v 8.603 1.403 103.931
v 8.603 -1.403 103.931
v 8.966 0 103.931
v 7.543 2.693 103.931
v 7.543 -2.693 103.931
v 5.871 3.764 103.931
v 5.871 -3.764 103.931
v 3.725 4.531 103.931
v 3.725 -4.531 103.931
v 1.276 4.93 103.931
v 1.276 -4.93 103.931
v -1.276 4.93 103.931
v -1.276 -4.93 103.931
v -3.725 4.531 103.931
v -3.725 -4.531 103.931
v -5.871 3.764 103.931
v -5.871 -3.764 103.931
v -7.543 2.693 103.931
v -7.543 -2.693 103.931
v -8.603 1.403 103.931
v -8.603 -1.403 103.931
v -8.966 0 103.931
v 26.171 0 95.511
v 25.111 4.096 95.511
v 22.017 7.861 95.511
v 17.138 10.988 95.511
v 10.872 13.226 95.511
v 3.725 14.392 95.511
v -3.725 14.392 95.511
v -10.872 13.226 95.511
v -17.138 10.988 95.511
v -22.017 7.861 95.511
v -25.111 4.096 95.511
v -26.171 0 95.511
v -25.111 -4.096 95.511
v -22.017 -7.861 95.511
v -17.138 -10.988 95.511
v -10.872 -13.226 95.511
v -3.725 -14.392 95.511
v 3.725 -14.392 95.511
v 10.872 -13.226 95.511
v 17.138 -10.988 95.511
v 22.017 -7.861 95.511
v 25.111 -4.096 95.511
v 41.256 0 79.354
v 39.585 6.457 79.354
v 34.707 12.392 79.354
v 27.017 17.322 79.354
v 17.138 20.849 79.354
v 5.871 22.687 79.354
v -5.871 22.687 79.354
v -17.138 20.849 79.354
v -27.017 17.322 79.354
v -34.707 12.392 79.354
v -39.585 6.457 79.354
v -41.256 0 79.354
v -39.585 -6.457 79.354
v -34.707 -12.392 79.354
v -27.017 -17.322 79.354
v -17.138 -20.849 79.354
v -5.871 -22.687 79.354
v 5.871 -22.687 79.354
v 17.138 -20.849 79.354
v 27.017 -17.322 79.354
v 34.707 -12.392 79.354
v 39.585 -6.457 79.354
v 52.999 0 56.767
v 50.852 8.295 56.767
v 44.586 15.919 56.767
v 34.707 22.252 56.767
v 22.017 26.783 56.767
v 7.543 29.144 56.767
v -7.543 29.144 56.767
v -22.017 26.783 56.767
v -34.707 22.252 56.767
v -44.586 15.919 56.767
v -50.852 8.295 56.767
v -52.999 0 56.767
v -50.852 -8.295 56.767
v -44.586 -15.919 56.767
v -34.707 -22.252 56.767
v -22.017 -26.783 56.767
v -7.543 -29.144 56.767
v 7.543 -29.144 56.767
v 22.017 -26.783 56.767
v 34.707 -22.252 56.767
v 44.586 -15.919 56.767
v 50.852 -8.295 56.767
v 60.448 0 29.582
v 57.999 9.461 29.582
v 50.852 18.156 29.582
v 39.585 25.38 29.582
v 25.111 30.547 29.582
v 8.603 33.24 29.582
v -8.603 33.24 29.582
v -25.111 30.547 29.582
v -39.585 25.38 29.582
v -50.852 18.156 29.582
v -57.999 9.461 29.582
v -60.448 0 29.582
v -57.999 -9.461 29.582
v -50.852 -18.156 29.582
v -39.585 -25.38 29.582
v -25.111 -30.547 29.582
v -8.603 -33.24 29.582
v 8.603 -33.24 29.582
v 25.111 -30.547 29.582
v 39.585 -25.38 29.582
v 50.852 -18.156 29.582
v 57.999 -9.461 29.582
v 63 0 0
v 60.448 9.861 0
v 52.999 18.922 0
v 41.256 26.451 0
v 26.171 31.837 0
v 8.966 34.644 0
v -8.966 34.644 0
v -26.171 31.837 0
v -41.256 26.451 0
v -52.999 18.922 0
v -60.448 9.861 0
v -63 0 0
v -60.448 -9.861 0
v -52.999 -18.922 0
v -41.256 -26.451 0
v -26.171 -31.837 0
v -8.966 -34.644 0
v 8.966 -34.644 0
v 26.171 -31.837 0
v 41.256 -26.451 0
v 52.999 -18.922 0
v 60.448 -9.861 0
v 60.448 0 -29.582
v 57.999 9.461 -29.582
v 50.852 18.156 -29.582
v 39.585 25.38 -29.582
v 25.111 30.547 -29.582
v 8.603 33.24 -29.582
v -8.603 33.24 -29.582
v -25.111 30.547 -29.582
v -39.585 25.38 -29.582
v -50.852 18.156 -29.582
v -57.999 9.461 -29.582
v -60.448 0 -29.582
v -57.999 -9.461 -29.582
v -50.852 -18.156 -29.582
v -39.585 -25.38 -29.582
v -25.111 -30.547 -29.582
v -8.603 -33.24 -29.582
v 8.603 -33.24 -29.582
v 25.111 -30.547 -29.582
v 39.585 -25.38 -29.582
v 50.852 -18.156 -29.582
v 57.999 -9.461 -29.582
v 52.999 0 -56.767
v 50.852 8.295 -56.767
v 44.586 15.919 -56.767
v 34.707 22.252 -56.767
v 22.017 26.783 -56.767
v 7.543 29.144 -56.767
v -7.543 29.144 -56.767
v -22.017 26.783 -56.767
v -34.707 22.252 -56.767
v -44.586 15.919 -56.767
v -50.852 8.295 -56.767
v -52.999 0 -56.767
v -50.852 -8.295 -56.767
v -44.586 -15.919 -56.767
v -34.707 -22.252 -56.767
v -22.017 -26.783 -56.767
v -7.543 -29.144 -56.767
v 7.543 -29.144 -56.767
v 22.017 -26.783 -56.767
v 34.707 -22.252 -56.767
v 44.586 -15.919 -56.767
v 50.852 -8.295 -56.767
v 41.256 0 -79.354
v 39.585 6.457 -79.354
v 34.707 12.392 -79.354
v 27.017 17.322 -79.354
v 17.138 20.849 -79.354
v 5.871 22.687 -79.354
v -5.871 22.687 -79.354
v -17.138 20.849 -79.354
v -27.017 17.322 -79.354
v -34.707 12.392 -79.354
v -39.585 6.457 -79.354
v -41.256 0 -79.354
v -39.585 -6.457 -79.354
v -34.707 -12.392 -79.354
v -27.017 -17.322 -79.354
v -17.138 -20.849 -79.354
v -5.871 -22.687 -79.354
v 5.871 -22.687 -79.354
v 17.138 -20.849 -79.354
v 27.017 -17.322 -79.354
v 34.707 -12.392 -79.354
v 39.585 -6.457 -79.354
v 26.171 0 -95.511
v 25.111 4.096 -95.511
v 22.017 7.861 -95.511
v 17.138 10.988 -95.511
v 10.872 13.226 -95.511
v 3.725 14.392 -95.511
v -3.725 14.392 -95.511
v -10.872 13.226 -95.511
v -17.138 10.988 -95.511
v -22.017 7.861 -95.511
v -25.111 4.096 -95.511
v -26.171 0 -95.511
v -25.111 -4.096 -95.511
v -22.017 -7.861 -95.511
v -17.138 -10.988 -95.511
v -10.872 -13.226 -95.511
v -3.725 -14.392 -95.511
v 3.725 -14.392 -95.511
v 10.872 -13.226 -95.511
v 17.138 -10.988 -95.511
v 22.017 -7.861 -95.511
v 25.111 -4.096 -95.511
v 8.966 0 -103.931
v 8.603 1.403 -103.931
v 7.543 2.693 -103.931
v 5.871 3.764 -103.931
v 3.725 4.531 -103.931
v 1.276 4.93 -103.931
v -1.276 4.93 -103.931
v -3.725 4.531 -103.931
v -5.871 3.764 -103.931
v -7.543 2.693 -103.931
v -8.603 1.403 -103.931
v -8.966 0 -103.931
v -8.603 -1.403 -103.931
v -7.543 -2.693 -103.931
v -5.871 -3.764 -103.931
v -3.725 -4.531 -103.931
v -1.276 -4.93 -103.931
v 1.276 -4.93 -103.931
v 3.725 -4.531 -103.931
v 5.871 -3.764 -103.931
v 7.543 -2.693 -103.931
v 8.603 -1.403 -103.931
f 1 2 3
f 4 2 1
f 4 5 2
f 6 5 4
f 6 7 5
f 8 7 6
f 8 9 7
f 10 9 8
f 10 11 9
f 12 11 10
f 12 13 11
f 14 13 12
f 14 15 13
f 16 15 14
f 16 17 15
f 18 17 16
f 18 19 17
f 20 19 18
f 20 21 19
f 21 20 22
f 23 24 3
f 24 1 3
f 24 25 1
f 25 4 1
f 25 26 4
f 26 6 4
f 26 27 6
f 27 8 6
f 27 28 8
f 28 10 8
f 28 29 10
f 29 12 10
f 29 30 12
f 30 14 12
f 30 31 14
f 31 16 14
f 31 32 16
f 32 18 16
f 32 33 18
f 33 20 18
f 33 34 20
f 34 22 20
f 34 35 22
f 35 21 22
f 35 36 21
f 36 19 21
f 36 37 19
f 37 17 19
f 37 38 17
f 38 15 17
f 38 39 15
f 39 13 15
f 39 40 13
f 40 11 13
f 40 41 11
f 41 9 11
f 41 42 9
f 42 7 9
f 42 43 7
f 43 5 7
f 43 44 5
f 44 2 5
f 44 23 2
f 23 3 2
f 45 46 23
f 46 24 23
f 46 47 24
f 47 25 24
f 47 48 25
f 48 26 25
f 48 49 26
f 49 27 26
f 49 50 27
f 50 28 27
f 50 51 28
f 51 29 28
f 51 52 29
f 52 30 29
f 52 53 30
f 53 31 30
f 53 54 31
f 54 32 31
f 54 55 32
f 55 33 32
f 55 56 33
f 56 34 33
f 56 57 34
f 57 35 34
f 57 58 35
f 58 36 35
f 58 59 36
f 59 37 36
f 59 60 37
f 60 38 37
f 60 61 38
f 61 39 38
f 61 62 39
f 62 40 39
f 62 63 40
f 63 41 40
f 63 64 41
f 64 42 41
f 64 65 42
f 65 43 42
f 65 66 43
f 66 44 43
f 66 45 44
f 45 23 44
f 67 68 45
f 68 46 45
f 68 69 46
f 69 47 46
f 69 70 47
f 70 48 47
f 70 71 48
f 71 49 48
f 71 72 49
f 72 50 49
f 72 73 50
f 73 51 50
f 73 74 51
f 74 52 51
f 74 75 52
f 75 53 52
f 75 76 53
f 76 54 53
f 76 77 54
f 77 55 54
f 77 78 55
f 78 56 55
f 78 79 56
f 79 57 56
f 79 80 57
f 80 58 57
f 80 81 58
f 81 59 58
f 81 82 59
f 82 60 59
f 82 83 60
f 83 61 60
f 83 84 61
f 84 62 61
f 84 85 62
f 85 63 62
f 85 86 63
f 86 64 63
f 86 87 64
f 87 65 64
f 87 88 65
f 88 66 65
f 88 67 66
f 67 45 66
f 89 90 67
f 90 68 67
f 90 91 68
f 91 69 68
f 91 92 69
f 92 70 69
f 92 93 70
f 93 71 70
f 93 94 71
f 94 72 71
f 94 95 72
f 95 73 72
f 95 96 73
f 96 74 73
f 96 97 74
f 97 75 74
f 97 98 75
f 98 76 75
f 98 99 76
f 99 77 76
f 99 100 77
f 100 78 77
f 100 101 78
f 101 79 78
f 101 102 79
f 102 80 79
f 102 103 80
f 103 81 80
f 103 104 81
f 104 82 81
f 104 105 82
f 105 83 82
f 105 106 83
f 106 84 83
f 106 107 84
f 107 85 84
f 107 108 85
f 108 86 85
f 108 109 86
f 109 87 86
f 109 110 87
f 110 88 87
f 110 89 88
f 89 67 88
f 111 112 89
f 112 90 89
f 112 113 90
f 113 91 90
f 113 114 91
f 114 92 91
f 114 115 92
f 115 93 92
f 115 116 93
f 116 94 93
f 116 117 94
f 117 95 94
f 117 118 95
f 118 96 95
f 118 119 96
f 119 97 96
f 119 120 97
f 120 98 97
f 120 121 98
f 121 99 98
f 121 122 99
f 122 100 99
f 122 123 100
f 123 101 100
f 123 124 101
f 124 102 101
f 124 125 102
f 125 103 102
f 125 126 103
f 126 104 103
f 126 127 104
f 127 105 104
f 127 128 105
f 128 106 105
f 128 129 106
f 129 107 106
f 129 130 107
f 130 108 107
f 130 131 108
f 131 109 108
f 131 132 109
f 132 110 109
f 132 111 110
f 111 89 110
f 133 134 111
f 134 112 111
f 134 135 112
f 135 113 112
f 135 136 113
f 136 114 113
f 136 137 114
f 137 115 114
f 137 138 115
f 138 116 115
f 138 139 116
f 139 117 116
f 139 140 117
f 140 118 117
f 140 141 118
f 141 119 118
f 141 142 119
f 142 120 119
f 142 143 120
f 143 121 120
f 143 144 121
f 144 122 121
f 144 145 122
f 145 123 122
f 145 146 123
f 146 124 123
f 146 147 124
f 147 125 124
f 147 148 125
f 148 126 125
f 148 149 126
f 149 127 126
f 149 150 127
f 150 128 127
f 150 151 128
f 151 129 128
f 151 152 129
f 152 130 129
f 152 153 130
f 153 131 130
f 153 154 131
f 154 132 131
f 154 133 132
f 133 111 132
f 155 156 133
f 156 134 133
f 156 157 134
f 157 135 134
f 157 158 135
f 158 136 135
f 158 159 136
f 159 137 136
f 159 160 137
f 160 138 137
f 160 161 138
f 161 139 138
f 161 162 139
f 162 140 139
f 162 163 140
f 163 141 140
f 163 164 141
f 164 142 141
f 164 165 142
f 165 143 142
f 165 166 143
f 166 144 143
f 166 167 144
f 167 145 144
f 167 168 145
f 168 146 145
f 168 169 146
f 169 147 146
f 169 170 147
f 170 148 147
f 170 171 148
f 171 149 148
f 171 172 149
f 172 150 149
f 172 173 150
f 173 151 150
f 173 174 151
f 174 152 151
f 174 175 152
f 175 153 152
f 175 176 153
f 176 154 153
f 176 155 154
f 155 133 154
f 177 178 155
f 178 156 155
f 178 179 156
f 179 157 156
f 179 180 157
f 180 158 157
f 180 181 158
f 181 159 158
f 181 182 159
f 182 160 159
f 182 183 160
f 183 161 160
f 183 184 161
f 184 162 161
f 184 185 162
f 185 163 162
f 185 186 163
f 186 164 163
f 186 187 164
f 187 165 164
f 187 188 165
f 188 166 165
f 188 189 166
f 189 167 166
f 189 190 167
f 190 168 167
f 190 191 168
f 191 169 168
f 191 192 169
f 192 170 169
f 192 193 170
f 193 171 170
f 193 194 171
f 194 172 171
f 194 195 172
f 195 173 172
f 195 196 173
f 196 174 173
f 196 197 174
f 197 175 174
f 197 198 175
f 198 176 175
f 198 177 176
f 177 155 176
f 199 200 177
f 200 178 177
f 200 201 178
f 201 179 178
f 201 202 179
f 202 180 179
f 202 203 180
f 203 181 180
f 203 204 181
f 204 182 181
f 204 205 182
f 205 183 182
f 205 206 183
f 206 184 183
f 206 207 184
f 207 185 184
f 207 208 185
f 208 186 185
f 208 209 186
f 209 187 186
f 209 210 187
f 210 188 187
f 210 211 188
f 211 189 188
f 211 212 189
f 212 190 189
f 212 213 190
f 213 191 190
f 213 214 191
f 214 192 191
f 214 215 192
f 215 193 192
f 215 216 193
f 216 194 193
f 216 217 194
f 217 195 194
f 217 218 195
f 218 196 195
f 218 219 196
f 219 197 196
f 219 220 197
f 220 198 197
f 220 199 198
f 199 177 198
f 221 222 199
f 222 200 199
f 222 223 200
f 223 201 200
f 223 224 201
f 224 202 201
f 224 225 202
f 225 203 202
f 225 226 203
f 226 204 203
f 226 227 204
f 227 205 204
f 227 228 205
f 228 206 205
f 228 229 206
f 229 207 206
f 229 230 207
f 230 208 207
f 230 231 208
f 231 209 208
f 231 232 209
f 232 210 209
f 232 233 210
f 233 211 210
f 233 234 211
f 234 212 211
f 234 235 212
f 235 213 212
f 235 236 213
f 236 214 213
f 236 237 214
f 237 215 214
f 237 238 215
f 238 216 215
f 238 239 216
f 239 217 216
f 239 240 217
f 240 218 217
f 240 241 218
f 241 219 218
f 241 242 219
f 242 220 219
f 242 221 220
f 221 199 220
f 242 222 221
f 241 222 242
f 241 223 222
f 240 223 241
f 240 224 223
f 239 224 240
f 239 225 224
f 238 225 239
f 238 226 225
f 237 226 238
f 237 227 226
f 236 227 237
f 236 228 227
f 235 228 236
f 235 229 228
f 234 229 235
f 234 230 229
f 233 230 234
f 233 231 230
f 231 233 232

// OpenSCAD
// Generated by SolidPython 1.0.1 on 2020-07-29 00:46:48


scale(v = [9, 5, 15]) {
	sphere(r = 7);
}
/***********************************************
*********      SolidPython code:      **********
************************************************
 
# import packages: SolidPython
from solid import *
from solid.utils import *
from itertools import chain, combinations, permutations


class Resize:

    def __init__(self, scad_file):
        self.scad_file = scad_file
        #self.scad_file = import_scad(scad_file)
        # cone/cylinder param:
        self.r1 = 0
        self.r2 = 0
        self.h = 0
        # rectangular prism param:
        self.w = 0
        self.l = 0
        # ellipse param:
        self.r = 0

    # import OpenScad code (file name corresponds to shape)


    # classify shape + parameters
    def assign(self, param1, param2, param3):
        if self.scad_file == 'cone.scad':
            self.r1 = param1
            self.r2 = param2
            self.h = param3
        elif self.scad_file == 'cylinder.scad':
            self.r1 = param1
            self.r2 = param2
            self.h = param3
        elif self.scad_file == 'rectangularPrism.scad':
            self.h = param1
            self.l = param2
            self.w = param3
        else:
            self.r = param1
            self.h = param2

    # resize parameters
    def iterate(self):
        x = range(3, 20, 2)
        i = 1
        if self.scad_file == 'cone.scad':
            tempList = list(permutations(x, 2))
            for temp in tempList:
                param1 = temp[0]
                param2 = temp[1]
                filepath = 'produced_scad_files/' + 'cone' + str(param1) + '_' + str(param2) + '_' + '.scad'
                scad_render_to_file(cylinder(h=param1, r1=param2, r2=0), filepath)

        elif self.scad_file == 'cylinder.scad':
            tempList = list(permutations(x, 3))
            for temp in tempList:
                param1 = temp[0]
                param2 = temp[1]
                filepath = 'produced_scad_files/' + 'cylinder' + str(param1) + '_' + str(param2) + '_' + '.scad'
                scad_render_to_file(cylinder(h=param1, r1=param2, r2=param2), filepath)

        elif self.scad_file == 'rectangularPrism.scad':
            tempList = list(permutations(x, 3))
            for temp in tempList:
                param1 = temp[0]
                param2 = temp[1]
                param3 = temp[2]
                filepath = 'produced_scad_files/' + 'rectangularPrism' + str(param1) + '_' + str(param2) + '_' + str(
                    param3) + '.scad'
                scad_render_to_file(cube(size=(param1, param2, param3)), filepath)

        elif self.scad_file == 'ellipse.scad':
            tempList = list(permutations(x, 4))
            for temp in tempList:
                param1 = temp[0]
                param2 = temp[1]
                param3 = temp[2]
                param4 = temp[3]
                filepath = 'produced_scad_files/' + 'ellipse' + str(param1) + '_' + str(param2) + '_' + str(param3) + '_' + str(param4) + '.scad'
                scad_render_to_file(scale([param1, param2, param3])(sphere(r=param4)), filepath)

    def render_to_scadfile(self):
        scad_render_to_file(scad, 'example.scad') 
 
************************************************/
